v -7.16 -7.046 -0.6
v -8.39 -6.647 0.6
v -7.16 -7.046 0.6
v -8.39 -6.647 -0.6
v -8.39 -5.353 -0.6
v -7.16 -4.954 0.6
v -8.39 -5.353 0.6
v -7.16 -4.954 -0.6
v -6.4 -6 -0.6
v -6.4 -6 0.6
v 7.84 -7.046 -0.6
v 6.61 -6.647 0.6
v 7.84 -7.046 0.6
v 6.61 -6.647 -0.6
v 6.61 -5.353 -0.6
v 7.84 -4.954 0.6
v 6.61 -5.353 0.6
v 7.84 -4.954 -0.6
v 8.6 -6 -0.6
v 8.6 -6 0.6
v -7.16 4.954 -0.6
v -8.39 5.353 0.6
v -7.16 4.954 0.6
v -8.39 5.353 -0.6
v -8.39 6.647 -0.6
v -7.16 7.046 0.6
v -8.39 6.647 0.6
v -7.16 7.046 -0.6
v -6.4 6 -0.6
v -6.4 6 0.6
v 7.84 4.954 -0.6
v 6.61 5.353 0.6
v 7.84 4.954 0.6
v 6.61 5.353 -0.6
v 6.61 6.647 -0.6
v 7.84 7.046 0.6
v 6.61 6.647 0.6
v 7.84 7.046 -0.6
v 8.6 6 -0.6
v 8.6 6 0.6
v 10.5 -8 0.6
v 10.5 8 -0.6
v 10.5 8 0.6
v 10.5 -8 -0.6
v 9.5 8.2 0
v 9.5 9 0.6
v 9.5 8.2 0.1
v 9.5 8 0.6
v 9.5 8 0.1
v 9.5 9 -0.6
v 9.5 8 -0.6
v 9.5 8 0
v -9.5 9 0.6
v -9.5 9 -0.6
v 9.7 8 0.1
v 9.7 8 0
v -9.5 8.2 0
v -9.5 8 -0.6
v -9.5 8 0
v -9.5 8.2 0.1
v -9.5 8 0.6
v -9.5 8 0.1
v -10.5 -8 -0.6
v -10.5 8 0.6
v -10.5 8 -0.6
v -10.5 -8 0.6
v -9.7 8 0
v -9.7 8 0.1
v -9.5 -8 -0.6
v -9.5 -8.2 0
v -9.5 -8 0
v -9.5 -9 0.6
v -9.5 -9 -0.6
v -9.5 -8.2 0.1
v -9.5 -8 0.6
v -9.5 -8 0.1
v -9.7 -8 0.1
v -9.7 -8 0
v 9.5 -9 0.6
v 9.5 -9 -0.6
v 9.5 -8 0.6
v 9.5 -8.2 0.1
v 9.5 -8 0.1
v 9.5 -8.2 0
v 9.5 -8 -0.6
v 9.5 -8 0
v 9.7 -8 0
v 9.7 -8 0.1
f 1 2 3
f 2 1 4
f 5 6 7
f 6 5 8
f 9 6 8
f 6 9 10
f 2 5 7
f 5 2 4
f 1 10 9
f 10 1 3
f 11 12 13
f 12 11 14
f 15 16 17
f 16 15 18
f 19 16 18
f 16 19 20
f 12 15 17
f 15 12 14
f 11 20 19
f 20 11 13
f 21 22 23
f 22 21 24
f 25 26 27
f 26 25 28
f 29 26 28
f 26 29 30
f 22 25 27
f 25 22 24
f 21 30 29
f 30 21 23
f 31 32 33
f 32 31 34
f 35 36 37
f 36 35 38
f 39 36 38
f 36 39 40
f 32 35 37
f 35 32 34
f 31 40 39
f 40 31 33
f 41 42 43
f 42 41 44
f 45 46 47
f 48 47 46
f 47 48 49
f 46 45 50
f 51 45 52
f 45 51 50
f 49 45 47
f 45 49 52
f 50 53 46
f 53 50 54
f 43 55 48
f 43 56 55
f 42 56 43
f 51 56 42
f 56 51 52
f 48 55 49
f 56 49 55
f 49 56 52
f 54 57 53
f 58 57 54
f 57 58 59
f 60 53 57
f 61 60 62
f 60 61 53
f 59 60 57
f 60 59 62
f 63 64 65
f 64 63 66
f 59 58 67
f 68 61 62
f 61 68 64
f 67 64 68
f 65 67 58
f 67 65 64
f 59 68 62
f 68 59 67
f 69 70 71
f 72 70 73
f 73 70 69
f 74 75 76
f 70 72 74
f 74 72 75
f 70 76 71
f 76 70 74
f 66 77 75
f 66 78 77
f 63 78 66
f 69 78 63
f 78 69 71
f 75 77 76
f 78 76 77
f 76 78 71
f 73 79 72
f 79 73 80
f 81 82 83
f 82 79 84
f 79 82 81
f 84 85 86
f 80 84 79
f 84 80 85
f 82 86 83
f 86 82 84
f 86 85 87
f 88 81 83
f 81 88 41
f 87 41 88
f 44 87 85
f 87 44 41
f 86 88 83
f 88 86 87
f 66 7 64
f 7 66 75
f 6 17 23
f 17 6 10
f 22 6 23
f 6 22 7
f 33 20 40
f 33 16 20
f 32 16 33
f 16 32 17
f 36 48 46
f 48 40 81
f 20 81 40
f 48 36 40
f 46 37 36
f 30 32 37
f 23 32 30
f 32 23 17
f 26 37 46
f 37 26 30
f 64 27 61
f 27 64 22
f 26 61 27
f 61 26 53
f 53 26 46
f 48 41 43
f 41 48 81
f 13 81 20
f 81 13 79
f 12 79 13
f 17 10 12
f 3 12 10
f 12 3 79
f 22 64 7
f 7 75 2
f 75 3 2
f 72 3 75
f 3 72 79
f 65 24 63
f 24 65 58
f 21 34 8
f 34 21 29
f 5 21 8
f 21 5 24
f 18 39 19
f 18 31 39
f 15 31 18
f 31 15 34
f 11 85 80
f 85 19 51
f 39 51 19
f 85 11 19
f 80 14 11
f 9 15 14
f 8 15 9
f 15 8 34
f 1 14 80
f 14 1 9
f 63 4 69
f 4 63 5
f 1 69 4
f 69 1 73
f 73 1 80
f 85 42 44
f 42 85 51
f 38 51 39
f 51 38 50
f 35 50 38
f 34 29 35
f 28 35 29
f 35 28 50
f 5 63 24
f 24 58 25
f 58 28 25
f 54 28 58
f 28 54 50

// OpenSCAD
// Parameters
pcb_L = 21.0; //[10.5:42.0:0.5]
pcb_W = 18.0; //[9.0:36.0:0.5]
pcb_T = 1.2; //[0.6:2.4:0.1]
hole_d = 2.2; //[1.0:4.4:0.1]
hole_edge_margin = 3.0; //[1.5:6.0:0.1]
hole_clearance_z = 0.5; //[0.2:2.0:0.1]
chamfer_size = 1.0; //[0.5:2.0:0.1]
marking_T = 0.1; //[0.05:0.3:0.05]
marking_line_W = 0.4; //[0.2:1.0:0.1]
marking_inset = 1.0; //[0.5:3.0:0.1]
pad_T = 0.05; //[0.02:0.2:0.01]
pad_L = 1.6; //[0.8:3.2:0.1]
pad_W = 1.0; //[0.5:2.0:0.1]
pad_pitch = 2.54; //[1.27:5.08:0.01]
pad_row_y = 0.0; //[-6.0:6.0:0.1]
outline_T = 0.08; //[0.04:0.2:0.01]
outline_L = 10.0; //[5.0:20.0:0.5]
outline_W = 6.0; //[3.0:12.0:0.5]
outline_line_W = 0.4; //[0.2:1.0:0.1]
outline_center_x = 0.0; //[-5.0:5.0:0.1]
outline_center_y = 4.0; //[-6.0:6.0:0.1]
overlap = 0.6; //[0.3:1.5:0.1]

// PCB Body with Holes and Chamfer
module pcb_body_with_holes_and_chamfer() {
  difference() {
    color([0.0, 0.4, 0.2]) // PCB color
    cube([pcb_L, pcb_W, pcb_T], center=true);
    union() {
      translate([-pcb_L/2 + hole_edge_margin, -pcb_W/2 + hole_edge_margin, 0])
        cylinder(h=pcb_T + hole_clearance_z, r=hole_d/2, center=true);
      translate([pcb_L/2 - hole_edge_margin, -pcb_W/2 + hole_edge_margin, 0])
        cylinder(h=pcb_T + hole_clearance_z, r=hole_d/2, center=true);
      translate([-pcb_L/2 + hole_edge_margin, pcb_W/2 - hole_edge_margin, 0])
        cylinder(h=pcb_T + hole_clearance_z, r=hole_d/2, center=true);
      translate([pcb_L/2 - hole_edge_margin, pcb_W/2 - hole_edge_margin, 0])
        cylinder(h=pcb_T + hole_clearance_z, r=hole_d/2, center=true);
    }
    union() {
      translate([pcb_L/2 - chamfer_size/2, pcb_W/2 - chamfer_size/2, 0])
        cube([chamfer_size, chamfer_size, pcb_T + hole_clearance_z], center=true);
      translate([-pcb_L/2 + chamfer_size/2, pcb_W/2 - chamfer_size/2, 0])
        cube([chamfer_size, chamfer_size, pcb_T + hole_clearance_z], center=true);
      translate([-pcb_L/2 + chamfer_size/2, -pcb_W/2 + chamfer_size/2, 0])
        cube([chamfer_size, chamfer_size, pcb_T + hole_clearance_z], center=true);
      translate([pcb_L/2 - chamfer_size/2, -pcb_W/2 + chamfer_size/2, 0])
        cube([chamfer_size, chamfer_size, pcb_T + hole_clearance_z], center=true);
    }
  }
}

// Silkscreen Markings
module silkscreen_markings() {
  color("White")
  union() {
    translate([0, pcb_W/2 - marking_inset, pcb_T/2 + marking_T/2 - overlap])
      cube([pcb_L - 2*marking_inset, marking_line_W, marking_T], center=true);
    translate([0, -pcb_W/2 + marking_inset, pcb_T/2 + marking_T/2 - overlap])
      cube([pcb_L - 2*marking_inset, marking_line_W, marking_T], center=true);
    translate([-pcb_L/2 + marking_inset, 0, pcb_T/2 + marking_T/2 - overlap])
      cube([marking_line_W, pcb_W - 2*marking_inset, marking_T], center=true);
    translate([pcb_L/2 - marking_inset, 0, pcb_T/2 + marking_T/2 - overlap])
      cube([marking_line_W, pcb_W - 2*marking_inset, marking_T], center=true);
  }
}

// Copper Pads
module copper_pads() {
  color([0.72, 0.45, 0.2]) // Copper color
  union() {
    translate([-1.5*pad_pitch, pad_row_y, pcb_T/2 + pad_T/2 - overlap])
      cube([pad_L, pad_W, pad_T], center=true);
    translate([-0.5*pad_pitch, pad_row_y, pcb_T/2 + pad_T/2 - overlap])
      cube([pad_L, pad_W, pad_T], center=true);
    translate([0.5*pad_pitch, pad_row_y, pcb_T/2 + pad_T/2 - overlap])
      cube([pad_L, pad_W, pad_T], center=true);
    translate([1.5*pad_pitch, pad_row_y, pcb_T/2 + pad_T/2 - overlap])
      cube([pad_L, pad_W, pad_T], center=true);
  }
}

// Component Outline
module components_outline() {
  color([0.85, 0.85, 0.8]) // Off-white for outline
  difference() {
    translate([outline_center_x, outline_center_y, pcb_T/2 + outline_T/2 - overlap])
      cube([outline_L, outline_W, outline_T], center=true);
    translate([outline_center_x, outline_center_y, pcb_T/2 + outline_T/2 - overlap])
      cube([outline_L - 2*outline_line_W, outline_W - 2*outline_line_W, outline_T + overlap], center=true);
  }
}

// Complete PCB
module pcb_complete() {
  union() {
    pcb_body_with_holes_and_chamfer();
    silkscreen_markings();
    copper_pads();
    components_outline();
  }
}

// Render the complete PCB
pcb_complete();
